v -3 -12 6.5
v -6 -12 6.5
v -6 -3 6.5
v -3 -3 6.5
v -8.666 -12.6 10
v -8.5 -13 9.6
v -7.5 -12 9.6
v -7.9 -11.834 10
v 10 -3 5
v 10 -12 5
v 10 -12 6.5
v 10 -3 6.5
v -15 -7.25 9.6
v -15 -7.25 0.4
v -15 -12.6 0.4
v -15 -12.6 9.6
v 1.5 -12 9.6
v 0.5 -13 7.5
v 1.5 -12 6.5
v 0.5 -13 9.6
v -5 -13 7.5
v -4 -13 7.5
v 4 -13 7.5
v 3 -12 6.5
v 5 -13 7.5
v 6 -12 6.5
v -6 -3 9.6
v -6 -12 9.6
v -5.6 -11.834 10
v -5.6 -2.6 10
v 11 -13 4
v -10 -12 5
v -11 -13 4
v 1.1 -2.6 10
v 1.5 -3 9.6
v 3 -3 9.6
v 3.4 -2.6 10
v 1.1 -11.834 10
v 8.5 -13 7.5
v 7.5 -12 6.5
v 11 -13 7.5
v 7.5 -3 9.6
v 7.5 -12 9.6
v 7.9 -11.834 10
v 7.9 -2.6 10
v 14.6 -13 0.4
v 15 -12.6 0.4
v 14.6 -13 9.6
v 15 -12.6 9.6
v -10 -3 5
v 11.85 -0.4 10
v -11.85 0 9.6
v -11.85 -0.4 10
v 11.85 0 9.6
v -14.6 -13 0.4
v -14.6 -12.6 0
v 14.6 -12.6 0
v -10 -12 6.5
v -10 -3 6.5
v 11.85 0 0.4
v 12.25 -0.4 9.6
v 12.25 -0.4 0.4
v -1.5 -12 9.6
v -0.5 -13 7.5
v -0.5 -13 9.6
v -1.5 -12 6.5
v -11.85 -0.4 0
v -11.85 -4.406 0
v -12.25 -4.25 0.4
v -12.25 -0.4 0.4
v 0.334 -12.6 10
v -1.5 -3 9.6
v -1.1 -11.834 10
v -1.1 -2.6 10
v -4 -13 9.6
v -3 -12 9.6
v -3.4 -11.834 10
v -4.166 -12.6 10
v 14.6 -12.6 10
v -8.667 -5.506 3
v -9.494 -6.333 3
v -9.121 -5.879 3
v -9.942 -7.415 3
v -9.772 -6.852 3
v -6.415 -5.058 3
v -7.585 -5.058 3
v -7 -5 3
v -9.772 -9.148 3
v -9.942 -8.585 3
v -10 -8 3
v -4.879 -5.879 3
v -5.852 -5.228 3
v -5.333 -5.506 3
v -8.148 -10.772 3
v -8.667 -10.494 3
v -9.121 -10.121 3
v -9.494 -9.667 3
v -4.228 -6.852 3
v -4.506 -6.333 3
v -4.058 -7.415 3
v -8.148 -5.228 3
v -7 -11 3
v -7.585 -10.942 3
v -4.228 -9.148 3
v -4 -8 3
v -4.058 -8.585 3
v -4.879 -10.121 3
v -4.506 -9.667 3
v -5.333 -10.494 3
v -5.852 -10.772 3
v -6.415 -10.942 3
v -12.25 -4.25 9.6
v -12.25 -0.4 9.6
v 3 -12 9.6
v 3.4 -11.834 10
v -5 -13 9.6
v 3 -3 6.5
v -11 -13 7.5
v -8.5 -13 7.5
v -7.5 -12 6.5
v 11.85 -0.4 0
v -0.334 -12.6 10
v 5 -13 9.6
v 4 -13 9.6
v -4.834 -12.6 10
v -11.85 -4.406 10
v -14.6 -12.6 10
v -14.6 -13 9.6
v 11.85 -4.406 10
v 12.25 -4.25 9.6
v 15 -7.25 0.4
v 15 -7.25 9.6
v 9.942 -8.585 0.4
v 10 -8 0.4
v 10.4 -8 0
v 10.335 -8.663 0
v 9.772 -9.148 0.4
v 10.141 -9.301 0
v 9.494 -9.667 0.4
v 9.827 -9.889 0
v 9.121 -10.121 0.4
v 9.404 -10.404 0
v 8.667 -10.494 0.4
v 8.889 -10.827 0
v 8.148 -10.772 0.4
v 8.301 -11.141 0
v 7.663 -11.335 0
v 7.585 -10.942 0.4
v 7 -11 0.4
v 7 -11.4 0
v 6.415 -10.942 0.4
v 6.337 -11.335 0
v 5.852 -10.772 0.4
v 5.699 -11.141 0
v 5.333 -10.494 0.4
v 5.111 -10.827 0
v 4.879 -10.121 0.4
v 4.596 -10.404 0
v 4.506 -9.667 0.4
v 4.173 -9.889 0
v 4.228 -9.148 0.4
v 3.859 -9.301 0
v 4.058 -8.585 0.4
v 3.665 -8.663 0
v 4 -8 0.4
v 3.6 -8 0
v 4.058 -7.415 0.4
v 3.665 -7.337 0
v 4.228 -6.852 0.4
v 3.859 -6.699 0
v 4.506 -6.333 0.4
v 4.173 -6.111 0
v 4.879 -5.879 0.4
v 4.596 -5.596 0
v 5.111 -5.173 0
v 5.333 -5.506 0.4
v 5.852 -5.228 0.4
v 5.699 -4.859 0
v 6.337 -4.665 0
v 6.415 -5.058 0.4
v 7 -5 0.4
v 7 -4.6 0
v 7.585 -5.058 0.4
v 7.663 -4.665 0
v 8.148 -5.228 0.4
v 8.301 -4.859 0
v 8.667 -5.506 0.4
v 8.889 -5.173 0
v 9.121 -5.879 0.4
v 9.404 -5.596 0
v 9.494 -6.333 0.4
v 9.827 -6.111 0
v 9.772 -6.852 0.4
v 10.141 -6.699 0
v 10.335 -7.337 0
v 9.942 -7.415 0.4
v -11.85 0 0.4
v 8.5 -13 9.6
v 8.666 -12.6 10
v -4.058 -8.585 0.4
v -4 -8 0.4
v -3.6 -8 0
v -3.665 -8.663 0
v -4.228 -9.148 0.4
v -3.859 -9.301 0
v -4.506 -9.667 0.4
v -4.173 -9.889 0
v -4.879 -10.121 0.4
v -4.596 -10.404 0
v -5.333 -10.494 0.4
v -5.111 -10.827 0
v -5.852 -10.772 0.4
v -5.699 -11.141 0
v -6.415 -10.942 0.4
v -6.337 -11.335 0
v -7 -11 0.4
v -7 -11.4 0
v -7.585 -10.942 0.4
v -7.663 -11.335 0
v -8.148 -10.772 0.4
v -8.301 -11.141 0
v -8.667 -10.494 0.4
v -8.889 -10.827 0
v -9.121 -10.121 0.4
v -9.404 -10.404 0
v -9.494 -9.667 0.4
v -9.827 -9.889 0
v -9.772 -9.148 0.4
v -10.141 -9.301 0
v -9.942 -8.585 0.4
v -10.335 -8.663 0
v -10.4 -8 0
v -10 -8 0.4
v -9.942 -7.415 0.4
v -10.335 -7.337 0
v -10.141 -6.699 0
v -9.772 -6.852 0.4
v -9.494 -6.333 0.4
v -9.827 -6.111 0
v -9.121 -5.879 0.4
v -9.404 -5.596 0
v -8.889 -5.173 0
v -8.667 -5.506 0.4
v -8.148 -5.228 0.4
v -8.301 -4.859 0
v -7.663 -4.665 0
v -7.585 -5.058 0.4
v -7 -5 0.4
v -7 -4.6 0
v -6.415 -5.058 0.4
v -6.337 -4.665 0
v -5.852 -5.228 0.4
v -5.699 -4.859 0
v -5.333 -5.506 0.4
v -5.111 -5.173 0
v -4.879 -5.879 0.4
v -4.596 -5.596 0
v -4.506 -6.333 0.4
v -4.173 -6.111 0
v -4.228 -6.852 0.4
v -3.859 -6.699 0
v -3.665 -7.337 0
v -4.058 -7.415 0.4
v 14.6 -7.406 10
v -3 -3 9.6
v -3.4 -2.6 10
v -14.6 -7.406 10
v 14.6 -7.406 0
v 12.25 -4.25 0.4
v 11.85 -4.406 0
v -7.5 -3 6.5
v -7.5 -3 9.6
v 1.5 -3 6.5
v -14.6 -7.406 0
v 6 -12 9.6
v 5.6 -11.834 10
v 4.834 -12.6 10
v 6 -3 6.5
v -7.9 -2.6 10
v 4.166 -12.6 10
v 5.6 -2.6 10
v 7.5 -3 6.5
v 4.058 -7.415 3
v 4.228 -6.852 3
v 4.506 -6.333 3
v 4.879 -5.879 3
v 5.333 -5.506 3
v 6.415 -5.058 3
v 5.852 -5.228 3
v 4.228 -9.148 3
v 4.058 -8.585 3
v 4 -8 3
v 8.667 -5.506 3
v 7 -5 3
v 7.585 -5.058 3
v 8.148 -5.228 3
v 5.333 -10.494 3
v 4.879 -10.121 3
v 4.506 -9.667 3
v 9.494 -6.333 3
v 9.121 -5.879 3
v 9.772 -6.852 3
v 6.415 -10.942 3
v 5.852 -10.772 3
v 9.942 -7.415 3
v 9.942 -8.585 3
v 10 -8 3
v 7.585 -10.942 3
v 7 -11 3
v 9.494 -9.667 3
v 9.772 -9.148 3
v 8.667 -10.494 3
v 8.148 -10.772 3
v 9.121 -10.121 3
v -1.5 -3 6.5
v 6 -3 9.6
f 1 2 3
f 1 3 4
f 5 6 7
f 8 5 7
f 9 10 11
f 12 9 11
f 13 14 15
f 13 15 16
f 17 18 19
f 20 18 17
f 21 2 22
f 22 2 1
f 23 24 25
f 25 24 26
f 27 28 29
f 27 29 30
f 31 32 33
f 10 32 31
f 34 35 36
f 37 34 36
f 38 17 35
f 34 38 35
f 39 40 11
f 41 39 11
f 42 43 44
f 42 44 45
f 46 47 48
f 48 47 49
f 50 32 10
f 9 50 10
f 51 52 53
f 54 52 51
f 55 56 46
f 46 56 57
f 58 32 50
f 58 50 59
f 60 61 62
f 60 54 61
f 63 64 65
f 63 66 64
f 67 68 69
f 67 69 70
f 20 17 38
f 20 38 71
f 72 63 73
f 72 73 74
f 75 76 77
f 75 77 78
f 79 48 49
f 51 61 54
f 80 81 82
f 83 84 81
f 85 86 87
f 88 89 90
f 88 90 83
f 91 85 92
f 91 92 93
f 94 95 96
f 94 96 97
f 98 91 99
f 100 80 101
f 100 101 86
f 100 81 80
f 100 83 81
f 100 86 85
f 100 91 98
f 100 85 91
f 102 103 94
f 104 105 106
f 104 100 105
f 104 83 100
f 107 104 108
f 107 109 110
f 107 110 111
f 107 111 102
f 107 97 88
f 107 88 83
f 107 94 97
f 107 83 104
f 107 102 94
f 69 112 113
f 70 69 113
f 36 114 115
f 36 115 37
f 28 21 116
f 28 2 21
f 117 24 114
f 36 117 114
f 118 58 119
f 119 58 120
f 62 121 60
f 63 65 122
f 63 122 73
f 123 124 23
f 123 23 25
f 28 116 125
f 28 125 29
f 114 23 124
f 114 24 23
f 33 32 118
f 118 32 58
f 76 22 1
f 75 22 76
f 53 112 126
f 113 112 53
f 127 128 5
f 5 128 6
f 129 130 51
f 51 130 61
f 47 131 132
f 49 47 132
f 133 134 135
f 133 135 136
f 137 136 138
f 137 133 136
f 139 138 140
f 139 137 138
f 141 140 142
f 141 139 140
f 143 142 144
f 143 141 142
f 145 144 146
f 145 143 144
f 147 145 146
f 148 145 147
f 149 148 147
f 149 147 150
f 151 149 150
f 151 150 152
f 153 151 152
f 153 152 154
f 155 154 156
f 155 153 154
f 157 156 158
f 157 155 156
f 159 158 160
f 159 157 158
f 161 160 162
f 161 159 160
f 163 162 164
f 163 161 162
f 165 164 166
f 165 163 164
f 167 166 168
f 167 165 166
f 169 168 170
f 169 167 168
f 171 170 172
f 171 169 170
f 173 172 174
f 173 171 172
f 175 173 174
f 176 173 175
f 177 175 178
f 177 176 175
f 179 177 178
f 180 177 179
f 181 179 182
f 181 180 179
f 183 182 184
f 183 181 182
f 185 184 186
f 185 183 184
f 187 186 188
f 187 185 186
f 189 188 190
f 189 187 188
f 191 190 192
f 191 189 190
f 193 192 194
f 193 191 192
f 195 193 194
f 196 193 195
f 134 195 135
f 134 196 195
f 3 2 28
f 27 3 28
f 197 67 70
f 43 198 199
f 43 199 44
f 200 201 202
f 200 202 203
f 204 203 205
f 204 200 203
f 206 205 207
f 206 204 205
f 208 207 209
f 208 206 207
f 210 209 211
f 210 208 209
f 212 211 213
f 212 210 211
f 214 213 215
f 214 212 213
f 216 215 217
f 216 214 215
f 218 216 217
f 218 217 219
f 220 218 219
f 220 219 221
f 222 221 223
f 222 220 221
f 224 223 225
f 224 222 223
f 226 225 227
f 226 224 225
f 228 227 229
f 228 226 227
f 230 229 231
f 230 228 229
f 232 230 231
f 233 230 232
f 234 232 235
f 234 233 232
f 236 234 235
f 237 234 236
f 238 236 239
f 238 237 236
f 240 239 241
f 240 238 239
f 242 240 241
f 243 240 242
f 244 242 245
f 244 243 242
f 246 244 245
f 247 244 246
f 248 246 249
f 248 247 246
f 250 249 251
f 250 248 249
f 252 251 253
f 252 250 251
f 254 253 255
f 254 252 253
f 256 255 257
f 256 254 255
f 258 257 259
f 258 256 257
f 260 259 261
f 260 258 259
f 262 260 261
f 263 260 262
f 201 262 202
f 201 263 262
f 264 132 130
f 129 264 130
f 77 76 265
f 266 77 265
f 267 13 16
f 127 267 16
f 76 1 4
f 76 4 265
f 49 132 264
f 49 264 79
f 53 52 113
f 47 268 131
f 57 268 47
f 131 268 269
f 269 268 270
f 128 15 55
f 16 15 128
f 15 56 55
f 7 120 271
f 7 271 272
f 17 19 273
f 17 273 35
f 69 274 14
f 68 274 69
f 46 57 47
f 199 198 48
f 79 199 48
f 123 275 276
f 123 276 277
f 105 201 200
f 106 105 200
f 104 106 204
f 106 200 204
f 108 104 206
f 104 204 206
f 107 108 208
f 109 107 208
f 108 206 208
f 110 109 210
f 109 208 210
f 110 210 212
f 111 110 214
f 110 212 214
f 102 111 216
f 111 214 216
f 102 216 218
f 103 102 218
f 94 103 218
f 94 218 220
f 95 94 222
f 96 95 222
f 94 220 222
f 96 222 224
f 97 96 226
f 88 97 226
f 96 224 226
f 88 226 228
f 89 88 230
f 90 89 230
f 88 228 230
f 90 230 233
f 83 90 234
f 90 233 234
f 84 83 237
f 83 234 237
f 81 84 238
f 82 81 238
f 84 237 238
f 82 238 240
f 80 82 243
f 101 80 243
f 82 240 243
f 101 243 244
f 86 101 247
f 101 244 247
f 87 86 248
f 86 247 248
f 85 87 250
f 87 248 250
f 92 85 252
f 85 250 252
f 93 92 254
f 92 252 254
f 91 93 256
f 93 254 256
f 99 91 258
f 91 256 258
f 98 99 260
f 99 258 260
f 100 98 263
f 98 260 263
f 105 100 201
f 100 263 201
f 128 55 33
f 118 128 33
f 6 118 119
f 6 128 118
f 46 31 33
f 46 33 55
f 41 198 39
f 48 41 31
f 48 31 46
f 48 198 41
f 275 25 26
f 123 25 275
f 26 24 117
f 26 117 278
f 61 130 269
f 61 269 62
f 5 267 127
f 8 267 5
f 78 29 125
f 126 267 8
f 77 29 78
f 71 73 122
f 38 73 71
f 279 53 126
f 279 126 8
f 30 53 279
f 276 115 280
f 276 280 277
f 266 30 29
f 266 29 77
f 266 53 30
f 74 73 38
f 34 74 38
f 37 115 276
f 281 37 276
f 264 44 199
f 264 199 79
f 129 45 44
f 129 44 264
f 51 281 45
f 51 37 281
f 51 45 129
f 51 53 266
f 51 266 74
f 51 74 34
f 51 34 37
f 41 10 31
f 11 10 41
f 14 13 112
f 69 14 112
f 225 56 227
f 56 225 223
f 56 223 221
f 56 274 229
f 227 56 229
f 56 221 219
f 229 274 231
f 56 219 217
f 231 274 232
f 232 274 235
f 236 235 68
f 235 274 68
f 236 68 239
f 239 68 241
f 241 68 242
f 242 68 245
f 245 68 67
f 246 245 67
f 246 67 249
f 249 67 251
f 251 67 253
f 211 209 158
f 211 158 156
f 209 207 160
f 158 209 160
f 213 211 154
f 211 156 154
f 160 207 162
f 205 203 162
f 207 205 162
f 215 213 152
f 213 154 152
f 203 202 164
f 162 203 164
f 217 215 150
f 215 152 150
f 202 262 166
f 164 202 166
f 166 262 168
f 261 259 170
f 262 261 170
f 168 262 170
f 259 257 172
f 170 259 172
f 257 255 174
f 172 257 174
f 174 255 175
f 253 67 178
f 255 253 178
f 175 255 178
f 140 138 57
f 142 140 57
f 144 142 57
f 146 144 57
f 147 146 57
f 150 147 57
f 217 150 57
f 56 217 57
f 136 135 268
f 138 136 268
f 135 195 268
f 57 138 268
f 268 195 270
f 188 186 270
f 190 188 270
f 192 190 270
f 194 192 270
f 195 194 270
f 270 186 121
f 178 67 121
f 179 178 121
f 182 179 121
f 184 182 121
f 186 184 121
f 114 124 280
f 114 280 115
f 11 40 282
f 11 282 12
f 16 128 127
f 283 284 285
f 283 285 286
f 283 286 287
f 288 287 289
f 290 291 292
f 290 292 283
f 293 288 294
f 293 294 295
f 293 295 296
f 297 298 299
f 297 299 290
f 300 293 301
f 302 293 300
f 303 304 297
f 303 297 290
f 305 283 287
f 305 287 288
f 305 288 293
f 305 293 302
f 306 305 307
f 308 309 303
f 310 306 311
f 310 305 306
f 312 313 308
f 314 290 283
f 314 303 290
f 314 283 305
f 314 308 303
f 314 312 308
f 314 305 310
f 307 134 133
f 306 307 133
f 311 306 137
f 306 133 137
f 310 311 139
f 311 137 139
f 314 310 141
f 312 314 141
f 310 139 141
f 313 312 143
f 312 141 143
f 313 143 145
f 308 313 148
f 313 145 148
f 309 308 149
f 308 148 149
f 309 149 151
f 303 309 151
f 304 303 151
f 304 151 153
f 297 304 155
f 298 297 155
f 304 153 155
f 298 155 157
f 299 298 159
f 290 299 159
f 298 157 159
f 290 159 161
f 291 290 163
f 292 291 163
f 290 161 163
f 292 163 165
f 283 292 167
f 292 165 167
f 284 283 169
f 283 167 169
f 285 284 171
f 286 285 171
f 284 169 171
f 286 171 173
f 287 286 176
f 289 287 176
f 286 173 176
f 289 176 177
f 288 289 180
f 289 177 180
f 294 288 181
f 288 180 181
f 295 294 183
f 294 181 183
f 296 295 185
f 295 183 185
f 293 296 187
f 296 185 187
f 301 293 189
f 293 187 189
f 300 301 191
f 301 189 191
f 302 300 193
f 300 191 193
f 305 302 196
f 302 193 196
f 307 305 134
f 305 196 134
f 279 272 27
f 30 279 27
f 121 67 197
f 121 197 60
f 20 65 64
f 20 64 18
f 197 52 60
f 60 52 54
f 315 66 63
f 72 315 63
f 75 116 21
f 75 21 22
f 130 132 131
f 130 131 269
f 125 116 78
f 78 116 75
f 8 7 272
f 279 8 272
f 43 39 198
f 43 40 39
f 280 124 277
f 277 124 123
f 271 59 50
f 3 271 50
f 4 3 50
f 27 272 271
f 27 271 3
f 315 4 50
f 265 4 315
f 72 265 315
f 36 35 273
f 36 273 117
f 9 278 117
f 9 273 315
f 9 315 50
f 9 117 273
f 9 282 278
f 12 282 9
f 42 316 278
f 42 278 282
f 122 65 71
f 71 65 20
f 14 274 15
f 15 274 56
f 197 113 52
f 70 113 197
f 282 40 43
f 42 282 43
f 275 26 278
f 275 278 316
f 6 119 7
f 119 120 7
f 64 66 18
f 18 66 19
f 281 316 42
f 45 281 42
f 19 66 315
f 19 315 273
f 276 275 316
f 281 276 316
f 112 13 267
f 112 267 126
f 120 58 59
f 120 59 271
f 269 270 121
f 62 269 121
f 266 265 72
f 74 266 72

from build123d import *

# Parameters (mm, degrees)
SKETCH_W        = 30
SKETCH_H        = 10
PAD_DEPTH       = 13
SKETCH001_W     = 20
SKETCH001_H     = 1.5
POCKET_DEPTH    = 10
SKETCH002_W     = 1.5
SKETCH002_H     = 3.5
POCKET001_DEPTH = 10
POCKET002_DEPTH = 10.001
CHAMFER_SIZE    = 1
SKETCH004_R     = 3
POCKET003_DEPTH = 3
CHAMFER001_SIZE = 0.4


with BuildPart() as part:
    # Sketch → Pad (new body)
    with BuildSketch(Plane.XZ):
        with Locations((0, 5)):
            Rectangle(SKETCH_W, SKETCH_H)
    extrude(amount=PAD_DEPTH)

    # Sketch001 (on Face6 of Pad) → Pocket (cut)
    with BuildSketch(Plane.XZ.offset(13)):
        with Locations((0, 5.75)):
            Rectangle(SKETCH001_W, SKETCH001_H)
    extrude(amount=-POCKET_DEPTH, mode=Mode.SUBTRACT)

    # Sketch002 (on Face5 of Pocket) → Pocket001 (cut)
    with BuildSketch(Plane.XZ.offset(13)):
        with Locations((-6.75, 8.25)):
            Rectangle(SKETCH002_W, SKETCH002_H)
        with Locations((-2.25, 8.25)):
            Rectangle(SKETCH002_W, SKETCH002_H)
        with Locations((2.25, 8.25)):
            Rectangle(SKETCH002_W, SKETCH002_H)
        with Locations((6.75, 8.25)):
            Rectangle(SKETCH002_W, SKETCH002_H)
    extrude(amount=-POCKET001_DEPTH, mode=Mode.SUBTRACT)

    # Sketch003 (on Face6 of Pocket001) → Pocket002 (cut, through all)
    with BuildSketch(Plane(origin=(0, 0, 10), x_dir=(-1, 0, 0), z_dir=(0, 0, 1))):
        Polygon((-15, 7.25), (-12.25, 4.25), (-12.25, 0), (-15, 0), align=None)
        Polygon((15, 7.25), (12.25, 4.25), (12.25, 0), (15, 0), align=None)
    extrude(amount=-POCKET002_DEPTH, mode=Mode.SUBTRACT)

    # Chamfer
    chamfer_edges = [part.edges().sort_by_distance(p)[0] for p in [
        (-7.5, -13, 8.25),
        (-8.75, -13, 6.5),
        (-10, -13, 5.75),
        (0, -13, 5),
        (10, -13, 5.75),
        (8.75, -13, 6.5),
        (7.5, -13, 8.25),
        (6, -13, 8.25),
        (4.5, -13, 6.5),
        (3, -13, 8.25),
        (1.5, -13, 8.25),
        (0, -13, 6.5),
        (-1.5, -13, 8.25),
        (-3, -13, 8.25),
        (-4.5, -13, 6.5),
        (-6, -13, 8.25),
    ]]
    chamfer(chamfer_edges, length=CHAMFER_SIZE)

    # Sketch004 (on Face6 of Chamfer) → Pocket003 (cut)
    with BuildSketch(Plane(origin=(0, 0, 0), x_dir=(1, 0, 0), z_dir=(0, 0, -1))):
        with Locations((-7, 8)):
            Circle(SKETCH004_R)
        with Locations((7, 8)):
            Circle(SKETCH004_R)
    extrude(amount=-POCKET003_DEPTH, mode=Mode.SUBTRACT)

    # Chamfer001
    chamfer001_edges = [part.edges().sort_by_distance(p)[0] for p in [
        (-13.625, -5.75, 0),
        (-15, -10.125, 0),
        (-12.25, -2.125, 0),
        (0, -13, 0),
        (0, 0, 0),
        (15, -10.125, 0),
        (12.25, -2.125, 0),
        (13.625, -5.75, 0),
        (-10, -8, 0),
        (4, -8, 0),
        (-15, -13, 5),
        (-12.25, 0, 5),
        (12.25, 0, 5),
        (15, -13, 5),
        (-11.75, -13, 10),
        (-8, -12.5, 10),
        (-7.5, -7.5, 10),
        (-6.75, -3, 10),
        (-6, -7.5, 10),
        (-5.5, -12.5, 10),
        (-4.5, -13, 10),
        (-3.5, -12.5, 10),
        (-3, -7.5, 10),
        (-2.25, -3, 10),
        (-1.5, -7.5, 10),
        (-1, -12.5, 10),
        (0, -13, 10),
        (1, -12.5, 10),
        (1.5, -7.5, 10),
        (2.25, -3, 10),
        (3, -7.5, 10),
        (3.5, -12.5, 10),
        (4.5, -13, 10),
        (5.5, -12.5, 10),
        (6, -7.5, 10),
        (6.75, -3, 10),
        (7.5, -7.5, 10),
        (8, -12.5, 10),
        (11.75, -13, 10),
        (15, -10.125, 10),
        (13.625, -5.75, 10),
        (12.25, -2.125, 10),
        (0, 0, 10),
        (-12.25, -2.125, 10),
        (-13.625, -5.75, 10),
        (-15, -10.125, 10),
    ]]
    chamfer(chamfer001_edges, length=CHAMFER001_SIZE)


solid = part.part
